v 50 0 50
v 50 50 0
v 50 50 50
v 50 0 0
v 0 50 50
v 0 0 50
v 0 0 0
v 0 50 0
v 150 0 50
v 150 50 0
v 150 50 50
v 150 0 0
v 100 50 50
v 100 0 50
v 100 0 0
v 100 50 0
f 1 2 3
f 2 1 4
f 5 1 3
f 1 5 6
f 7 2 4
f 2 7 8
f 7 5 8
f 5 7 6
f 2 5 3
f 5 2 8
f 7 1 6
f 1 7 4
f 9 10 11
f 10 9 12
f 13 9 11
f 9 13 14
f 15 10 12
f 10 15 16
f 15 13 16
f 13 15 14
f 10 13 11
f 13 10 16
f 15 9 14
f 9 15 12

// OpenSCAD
echo($preview=$preview); // true when doing openCSG preview, false otherwise

if($preview)
    color("red") sphere(50);
else
    cube(50);

translate([100, 0]) render() {
    if($preview)
        color("red") sphere(50);
    else
        cube(50);
}
